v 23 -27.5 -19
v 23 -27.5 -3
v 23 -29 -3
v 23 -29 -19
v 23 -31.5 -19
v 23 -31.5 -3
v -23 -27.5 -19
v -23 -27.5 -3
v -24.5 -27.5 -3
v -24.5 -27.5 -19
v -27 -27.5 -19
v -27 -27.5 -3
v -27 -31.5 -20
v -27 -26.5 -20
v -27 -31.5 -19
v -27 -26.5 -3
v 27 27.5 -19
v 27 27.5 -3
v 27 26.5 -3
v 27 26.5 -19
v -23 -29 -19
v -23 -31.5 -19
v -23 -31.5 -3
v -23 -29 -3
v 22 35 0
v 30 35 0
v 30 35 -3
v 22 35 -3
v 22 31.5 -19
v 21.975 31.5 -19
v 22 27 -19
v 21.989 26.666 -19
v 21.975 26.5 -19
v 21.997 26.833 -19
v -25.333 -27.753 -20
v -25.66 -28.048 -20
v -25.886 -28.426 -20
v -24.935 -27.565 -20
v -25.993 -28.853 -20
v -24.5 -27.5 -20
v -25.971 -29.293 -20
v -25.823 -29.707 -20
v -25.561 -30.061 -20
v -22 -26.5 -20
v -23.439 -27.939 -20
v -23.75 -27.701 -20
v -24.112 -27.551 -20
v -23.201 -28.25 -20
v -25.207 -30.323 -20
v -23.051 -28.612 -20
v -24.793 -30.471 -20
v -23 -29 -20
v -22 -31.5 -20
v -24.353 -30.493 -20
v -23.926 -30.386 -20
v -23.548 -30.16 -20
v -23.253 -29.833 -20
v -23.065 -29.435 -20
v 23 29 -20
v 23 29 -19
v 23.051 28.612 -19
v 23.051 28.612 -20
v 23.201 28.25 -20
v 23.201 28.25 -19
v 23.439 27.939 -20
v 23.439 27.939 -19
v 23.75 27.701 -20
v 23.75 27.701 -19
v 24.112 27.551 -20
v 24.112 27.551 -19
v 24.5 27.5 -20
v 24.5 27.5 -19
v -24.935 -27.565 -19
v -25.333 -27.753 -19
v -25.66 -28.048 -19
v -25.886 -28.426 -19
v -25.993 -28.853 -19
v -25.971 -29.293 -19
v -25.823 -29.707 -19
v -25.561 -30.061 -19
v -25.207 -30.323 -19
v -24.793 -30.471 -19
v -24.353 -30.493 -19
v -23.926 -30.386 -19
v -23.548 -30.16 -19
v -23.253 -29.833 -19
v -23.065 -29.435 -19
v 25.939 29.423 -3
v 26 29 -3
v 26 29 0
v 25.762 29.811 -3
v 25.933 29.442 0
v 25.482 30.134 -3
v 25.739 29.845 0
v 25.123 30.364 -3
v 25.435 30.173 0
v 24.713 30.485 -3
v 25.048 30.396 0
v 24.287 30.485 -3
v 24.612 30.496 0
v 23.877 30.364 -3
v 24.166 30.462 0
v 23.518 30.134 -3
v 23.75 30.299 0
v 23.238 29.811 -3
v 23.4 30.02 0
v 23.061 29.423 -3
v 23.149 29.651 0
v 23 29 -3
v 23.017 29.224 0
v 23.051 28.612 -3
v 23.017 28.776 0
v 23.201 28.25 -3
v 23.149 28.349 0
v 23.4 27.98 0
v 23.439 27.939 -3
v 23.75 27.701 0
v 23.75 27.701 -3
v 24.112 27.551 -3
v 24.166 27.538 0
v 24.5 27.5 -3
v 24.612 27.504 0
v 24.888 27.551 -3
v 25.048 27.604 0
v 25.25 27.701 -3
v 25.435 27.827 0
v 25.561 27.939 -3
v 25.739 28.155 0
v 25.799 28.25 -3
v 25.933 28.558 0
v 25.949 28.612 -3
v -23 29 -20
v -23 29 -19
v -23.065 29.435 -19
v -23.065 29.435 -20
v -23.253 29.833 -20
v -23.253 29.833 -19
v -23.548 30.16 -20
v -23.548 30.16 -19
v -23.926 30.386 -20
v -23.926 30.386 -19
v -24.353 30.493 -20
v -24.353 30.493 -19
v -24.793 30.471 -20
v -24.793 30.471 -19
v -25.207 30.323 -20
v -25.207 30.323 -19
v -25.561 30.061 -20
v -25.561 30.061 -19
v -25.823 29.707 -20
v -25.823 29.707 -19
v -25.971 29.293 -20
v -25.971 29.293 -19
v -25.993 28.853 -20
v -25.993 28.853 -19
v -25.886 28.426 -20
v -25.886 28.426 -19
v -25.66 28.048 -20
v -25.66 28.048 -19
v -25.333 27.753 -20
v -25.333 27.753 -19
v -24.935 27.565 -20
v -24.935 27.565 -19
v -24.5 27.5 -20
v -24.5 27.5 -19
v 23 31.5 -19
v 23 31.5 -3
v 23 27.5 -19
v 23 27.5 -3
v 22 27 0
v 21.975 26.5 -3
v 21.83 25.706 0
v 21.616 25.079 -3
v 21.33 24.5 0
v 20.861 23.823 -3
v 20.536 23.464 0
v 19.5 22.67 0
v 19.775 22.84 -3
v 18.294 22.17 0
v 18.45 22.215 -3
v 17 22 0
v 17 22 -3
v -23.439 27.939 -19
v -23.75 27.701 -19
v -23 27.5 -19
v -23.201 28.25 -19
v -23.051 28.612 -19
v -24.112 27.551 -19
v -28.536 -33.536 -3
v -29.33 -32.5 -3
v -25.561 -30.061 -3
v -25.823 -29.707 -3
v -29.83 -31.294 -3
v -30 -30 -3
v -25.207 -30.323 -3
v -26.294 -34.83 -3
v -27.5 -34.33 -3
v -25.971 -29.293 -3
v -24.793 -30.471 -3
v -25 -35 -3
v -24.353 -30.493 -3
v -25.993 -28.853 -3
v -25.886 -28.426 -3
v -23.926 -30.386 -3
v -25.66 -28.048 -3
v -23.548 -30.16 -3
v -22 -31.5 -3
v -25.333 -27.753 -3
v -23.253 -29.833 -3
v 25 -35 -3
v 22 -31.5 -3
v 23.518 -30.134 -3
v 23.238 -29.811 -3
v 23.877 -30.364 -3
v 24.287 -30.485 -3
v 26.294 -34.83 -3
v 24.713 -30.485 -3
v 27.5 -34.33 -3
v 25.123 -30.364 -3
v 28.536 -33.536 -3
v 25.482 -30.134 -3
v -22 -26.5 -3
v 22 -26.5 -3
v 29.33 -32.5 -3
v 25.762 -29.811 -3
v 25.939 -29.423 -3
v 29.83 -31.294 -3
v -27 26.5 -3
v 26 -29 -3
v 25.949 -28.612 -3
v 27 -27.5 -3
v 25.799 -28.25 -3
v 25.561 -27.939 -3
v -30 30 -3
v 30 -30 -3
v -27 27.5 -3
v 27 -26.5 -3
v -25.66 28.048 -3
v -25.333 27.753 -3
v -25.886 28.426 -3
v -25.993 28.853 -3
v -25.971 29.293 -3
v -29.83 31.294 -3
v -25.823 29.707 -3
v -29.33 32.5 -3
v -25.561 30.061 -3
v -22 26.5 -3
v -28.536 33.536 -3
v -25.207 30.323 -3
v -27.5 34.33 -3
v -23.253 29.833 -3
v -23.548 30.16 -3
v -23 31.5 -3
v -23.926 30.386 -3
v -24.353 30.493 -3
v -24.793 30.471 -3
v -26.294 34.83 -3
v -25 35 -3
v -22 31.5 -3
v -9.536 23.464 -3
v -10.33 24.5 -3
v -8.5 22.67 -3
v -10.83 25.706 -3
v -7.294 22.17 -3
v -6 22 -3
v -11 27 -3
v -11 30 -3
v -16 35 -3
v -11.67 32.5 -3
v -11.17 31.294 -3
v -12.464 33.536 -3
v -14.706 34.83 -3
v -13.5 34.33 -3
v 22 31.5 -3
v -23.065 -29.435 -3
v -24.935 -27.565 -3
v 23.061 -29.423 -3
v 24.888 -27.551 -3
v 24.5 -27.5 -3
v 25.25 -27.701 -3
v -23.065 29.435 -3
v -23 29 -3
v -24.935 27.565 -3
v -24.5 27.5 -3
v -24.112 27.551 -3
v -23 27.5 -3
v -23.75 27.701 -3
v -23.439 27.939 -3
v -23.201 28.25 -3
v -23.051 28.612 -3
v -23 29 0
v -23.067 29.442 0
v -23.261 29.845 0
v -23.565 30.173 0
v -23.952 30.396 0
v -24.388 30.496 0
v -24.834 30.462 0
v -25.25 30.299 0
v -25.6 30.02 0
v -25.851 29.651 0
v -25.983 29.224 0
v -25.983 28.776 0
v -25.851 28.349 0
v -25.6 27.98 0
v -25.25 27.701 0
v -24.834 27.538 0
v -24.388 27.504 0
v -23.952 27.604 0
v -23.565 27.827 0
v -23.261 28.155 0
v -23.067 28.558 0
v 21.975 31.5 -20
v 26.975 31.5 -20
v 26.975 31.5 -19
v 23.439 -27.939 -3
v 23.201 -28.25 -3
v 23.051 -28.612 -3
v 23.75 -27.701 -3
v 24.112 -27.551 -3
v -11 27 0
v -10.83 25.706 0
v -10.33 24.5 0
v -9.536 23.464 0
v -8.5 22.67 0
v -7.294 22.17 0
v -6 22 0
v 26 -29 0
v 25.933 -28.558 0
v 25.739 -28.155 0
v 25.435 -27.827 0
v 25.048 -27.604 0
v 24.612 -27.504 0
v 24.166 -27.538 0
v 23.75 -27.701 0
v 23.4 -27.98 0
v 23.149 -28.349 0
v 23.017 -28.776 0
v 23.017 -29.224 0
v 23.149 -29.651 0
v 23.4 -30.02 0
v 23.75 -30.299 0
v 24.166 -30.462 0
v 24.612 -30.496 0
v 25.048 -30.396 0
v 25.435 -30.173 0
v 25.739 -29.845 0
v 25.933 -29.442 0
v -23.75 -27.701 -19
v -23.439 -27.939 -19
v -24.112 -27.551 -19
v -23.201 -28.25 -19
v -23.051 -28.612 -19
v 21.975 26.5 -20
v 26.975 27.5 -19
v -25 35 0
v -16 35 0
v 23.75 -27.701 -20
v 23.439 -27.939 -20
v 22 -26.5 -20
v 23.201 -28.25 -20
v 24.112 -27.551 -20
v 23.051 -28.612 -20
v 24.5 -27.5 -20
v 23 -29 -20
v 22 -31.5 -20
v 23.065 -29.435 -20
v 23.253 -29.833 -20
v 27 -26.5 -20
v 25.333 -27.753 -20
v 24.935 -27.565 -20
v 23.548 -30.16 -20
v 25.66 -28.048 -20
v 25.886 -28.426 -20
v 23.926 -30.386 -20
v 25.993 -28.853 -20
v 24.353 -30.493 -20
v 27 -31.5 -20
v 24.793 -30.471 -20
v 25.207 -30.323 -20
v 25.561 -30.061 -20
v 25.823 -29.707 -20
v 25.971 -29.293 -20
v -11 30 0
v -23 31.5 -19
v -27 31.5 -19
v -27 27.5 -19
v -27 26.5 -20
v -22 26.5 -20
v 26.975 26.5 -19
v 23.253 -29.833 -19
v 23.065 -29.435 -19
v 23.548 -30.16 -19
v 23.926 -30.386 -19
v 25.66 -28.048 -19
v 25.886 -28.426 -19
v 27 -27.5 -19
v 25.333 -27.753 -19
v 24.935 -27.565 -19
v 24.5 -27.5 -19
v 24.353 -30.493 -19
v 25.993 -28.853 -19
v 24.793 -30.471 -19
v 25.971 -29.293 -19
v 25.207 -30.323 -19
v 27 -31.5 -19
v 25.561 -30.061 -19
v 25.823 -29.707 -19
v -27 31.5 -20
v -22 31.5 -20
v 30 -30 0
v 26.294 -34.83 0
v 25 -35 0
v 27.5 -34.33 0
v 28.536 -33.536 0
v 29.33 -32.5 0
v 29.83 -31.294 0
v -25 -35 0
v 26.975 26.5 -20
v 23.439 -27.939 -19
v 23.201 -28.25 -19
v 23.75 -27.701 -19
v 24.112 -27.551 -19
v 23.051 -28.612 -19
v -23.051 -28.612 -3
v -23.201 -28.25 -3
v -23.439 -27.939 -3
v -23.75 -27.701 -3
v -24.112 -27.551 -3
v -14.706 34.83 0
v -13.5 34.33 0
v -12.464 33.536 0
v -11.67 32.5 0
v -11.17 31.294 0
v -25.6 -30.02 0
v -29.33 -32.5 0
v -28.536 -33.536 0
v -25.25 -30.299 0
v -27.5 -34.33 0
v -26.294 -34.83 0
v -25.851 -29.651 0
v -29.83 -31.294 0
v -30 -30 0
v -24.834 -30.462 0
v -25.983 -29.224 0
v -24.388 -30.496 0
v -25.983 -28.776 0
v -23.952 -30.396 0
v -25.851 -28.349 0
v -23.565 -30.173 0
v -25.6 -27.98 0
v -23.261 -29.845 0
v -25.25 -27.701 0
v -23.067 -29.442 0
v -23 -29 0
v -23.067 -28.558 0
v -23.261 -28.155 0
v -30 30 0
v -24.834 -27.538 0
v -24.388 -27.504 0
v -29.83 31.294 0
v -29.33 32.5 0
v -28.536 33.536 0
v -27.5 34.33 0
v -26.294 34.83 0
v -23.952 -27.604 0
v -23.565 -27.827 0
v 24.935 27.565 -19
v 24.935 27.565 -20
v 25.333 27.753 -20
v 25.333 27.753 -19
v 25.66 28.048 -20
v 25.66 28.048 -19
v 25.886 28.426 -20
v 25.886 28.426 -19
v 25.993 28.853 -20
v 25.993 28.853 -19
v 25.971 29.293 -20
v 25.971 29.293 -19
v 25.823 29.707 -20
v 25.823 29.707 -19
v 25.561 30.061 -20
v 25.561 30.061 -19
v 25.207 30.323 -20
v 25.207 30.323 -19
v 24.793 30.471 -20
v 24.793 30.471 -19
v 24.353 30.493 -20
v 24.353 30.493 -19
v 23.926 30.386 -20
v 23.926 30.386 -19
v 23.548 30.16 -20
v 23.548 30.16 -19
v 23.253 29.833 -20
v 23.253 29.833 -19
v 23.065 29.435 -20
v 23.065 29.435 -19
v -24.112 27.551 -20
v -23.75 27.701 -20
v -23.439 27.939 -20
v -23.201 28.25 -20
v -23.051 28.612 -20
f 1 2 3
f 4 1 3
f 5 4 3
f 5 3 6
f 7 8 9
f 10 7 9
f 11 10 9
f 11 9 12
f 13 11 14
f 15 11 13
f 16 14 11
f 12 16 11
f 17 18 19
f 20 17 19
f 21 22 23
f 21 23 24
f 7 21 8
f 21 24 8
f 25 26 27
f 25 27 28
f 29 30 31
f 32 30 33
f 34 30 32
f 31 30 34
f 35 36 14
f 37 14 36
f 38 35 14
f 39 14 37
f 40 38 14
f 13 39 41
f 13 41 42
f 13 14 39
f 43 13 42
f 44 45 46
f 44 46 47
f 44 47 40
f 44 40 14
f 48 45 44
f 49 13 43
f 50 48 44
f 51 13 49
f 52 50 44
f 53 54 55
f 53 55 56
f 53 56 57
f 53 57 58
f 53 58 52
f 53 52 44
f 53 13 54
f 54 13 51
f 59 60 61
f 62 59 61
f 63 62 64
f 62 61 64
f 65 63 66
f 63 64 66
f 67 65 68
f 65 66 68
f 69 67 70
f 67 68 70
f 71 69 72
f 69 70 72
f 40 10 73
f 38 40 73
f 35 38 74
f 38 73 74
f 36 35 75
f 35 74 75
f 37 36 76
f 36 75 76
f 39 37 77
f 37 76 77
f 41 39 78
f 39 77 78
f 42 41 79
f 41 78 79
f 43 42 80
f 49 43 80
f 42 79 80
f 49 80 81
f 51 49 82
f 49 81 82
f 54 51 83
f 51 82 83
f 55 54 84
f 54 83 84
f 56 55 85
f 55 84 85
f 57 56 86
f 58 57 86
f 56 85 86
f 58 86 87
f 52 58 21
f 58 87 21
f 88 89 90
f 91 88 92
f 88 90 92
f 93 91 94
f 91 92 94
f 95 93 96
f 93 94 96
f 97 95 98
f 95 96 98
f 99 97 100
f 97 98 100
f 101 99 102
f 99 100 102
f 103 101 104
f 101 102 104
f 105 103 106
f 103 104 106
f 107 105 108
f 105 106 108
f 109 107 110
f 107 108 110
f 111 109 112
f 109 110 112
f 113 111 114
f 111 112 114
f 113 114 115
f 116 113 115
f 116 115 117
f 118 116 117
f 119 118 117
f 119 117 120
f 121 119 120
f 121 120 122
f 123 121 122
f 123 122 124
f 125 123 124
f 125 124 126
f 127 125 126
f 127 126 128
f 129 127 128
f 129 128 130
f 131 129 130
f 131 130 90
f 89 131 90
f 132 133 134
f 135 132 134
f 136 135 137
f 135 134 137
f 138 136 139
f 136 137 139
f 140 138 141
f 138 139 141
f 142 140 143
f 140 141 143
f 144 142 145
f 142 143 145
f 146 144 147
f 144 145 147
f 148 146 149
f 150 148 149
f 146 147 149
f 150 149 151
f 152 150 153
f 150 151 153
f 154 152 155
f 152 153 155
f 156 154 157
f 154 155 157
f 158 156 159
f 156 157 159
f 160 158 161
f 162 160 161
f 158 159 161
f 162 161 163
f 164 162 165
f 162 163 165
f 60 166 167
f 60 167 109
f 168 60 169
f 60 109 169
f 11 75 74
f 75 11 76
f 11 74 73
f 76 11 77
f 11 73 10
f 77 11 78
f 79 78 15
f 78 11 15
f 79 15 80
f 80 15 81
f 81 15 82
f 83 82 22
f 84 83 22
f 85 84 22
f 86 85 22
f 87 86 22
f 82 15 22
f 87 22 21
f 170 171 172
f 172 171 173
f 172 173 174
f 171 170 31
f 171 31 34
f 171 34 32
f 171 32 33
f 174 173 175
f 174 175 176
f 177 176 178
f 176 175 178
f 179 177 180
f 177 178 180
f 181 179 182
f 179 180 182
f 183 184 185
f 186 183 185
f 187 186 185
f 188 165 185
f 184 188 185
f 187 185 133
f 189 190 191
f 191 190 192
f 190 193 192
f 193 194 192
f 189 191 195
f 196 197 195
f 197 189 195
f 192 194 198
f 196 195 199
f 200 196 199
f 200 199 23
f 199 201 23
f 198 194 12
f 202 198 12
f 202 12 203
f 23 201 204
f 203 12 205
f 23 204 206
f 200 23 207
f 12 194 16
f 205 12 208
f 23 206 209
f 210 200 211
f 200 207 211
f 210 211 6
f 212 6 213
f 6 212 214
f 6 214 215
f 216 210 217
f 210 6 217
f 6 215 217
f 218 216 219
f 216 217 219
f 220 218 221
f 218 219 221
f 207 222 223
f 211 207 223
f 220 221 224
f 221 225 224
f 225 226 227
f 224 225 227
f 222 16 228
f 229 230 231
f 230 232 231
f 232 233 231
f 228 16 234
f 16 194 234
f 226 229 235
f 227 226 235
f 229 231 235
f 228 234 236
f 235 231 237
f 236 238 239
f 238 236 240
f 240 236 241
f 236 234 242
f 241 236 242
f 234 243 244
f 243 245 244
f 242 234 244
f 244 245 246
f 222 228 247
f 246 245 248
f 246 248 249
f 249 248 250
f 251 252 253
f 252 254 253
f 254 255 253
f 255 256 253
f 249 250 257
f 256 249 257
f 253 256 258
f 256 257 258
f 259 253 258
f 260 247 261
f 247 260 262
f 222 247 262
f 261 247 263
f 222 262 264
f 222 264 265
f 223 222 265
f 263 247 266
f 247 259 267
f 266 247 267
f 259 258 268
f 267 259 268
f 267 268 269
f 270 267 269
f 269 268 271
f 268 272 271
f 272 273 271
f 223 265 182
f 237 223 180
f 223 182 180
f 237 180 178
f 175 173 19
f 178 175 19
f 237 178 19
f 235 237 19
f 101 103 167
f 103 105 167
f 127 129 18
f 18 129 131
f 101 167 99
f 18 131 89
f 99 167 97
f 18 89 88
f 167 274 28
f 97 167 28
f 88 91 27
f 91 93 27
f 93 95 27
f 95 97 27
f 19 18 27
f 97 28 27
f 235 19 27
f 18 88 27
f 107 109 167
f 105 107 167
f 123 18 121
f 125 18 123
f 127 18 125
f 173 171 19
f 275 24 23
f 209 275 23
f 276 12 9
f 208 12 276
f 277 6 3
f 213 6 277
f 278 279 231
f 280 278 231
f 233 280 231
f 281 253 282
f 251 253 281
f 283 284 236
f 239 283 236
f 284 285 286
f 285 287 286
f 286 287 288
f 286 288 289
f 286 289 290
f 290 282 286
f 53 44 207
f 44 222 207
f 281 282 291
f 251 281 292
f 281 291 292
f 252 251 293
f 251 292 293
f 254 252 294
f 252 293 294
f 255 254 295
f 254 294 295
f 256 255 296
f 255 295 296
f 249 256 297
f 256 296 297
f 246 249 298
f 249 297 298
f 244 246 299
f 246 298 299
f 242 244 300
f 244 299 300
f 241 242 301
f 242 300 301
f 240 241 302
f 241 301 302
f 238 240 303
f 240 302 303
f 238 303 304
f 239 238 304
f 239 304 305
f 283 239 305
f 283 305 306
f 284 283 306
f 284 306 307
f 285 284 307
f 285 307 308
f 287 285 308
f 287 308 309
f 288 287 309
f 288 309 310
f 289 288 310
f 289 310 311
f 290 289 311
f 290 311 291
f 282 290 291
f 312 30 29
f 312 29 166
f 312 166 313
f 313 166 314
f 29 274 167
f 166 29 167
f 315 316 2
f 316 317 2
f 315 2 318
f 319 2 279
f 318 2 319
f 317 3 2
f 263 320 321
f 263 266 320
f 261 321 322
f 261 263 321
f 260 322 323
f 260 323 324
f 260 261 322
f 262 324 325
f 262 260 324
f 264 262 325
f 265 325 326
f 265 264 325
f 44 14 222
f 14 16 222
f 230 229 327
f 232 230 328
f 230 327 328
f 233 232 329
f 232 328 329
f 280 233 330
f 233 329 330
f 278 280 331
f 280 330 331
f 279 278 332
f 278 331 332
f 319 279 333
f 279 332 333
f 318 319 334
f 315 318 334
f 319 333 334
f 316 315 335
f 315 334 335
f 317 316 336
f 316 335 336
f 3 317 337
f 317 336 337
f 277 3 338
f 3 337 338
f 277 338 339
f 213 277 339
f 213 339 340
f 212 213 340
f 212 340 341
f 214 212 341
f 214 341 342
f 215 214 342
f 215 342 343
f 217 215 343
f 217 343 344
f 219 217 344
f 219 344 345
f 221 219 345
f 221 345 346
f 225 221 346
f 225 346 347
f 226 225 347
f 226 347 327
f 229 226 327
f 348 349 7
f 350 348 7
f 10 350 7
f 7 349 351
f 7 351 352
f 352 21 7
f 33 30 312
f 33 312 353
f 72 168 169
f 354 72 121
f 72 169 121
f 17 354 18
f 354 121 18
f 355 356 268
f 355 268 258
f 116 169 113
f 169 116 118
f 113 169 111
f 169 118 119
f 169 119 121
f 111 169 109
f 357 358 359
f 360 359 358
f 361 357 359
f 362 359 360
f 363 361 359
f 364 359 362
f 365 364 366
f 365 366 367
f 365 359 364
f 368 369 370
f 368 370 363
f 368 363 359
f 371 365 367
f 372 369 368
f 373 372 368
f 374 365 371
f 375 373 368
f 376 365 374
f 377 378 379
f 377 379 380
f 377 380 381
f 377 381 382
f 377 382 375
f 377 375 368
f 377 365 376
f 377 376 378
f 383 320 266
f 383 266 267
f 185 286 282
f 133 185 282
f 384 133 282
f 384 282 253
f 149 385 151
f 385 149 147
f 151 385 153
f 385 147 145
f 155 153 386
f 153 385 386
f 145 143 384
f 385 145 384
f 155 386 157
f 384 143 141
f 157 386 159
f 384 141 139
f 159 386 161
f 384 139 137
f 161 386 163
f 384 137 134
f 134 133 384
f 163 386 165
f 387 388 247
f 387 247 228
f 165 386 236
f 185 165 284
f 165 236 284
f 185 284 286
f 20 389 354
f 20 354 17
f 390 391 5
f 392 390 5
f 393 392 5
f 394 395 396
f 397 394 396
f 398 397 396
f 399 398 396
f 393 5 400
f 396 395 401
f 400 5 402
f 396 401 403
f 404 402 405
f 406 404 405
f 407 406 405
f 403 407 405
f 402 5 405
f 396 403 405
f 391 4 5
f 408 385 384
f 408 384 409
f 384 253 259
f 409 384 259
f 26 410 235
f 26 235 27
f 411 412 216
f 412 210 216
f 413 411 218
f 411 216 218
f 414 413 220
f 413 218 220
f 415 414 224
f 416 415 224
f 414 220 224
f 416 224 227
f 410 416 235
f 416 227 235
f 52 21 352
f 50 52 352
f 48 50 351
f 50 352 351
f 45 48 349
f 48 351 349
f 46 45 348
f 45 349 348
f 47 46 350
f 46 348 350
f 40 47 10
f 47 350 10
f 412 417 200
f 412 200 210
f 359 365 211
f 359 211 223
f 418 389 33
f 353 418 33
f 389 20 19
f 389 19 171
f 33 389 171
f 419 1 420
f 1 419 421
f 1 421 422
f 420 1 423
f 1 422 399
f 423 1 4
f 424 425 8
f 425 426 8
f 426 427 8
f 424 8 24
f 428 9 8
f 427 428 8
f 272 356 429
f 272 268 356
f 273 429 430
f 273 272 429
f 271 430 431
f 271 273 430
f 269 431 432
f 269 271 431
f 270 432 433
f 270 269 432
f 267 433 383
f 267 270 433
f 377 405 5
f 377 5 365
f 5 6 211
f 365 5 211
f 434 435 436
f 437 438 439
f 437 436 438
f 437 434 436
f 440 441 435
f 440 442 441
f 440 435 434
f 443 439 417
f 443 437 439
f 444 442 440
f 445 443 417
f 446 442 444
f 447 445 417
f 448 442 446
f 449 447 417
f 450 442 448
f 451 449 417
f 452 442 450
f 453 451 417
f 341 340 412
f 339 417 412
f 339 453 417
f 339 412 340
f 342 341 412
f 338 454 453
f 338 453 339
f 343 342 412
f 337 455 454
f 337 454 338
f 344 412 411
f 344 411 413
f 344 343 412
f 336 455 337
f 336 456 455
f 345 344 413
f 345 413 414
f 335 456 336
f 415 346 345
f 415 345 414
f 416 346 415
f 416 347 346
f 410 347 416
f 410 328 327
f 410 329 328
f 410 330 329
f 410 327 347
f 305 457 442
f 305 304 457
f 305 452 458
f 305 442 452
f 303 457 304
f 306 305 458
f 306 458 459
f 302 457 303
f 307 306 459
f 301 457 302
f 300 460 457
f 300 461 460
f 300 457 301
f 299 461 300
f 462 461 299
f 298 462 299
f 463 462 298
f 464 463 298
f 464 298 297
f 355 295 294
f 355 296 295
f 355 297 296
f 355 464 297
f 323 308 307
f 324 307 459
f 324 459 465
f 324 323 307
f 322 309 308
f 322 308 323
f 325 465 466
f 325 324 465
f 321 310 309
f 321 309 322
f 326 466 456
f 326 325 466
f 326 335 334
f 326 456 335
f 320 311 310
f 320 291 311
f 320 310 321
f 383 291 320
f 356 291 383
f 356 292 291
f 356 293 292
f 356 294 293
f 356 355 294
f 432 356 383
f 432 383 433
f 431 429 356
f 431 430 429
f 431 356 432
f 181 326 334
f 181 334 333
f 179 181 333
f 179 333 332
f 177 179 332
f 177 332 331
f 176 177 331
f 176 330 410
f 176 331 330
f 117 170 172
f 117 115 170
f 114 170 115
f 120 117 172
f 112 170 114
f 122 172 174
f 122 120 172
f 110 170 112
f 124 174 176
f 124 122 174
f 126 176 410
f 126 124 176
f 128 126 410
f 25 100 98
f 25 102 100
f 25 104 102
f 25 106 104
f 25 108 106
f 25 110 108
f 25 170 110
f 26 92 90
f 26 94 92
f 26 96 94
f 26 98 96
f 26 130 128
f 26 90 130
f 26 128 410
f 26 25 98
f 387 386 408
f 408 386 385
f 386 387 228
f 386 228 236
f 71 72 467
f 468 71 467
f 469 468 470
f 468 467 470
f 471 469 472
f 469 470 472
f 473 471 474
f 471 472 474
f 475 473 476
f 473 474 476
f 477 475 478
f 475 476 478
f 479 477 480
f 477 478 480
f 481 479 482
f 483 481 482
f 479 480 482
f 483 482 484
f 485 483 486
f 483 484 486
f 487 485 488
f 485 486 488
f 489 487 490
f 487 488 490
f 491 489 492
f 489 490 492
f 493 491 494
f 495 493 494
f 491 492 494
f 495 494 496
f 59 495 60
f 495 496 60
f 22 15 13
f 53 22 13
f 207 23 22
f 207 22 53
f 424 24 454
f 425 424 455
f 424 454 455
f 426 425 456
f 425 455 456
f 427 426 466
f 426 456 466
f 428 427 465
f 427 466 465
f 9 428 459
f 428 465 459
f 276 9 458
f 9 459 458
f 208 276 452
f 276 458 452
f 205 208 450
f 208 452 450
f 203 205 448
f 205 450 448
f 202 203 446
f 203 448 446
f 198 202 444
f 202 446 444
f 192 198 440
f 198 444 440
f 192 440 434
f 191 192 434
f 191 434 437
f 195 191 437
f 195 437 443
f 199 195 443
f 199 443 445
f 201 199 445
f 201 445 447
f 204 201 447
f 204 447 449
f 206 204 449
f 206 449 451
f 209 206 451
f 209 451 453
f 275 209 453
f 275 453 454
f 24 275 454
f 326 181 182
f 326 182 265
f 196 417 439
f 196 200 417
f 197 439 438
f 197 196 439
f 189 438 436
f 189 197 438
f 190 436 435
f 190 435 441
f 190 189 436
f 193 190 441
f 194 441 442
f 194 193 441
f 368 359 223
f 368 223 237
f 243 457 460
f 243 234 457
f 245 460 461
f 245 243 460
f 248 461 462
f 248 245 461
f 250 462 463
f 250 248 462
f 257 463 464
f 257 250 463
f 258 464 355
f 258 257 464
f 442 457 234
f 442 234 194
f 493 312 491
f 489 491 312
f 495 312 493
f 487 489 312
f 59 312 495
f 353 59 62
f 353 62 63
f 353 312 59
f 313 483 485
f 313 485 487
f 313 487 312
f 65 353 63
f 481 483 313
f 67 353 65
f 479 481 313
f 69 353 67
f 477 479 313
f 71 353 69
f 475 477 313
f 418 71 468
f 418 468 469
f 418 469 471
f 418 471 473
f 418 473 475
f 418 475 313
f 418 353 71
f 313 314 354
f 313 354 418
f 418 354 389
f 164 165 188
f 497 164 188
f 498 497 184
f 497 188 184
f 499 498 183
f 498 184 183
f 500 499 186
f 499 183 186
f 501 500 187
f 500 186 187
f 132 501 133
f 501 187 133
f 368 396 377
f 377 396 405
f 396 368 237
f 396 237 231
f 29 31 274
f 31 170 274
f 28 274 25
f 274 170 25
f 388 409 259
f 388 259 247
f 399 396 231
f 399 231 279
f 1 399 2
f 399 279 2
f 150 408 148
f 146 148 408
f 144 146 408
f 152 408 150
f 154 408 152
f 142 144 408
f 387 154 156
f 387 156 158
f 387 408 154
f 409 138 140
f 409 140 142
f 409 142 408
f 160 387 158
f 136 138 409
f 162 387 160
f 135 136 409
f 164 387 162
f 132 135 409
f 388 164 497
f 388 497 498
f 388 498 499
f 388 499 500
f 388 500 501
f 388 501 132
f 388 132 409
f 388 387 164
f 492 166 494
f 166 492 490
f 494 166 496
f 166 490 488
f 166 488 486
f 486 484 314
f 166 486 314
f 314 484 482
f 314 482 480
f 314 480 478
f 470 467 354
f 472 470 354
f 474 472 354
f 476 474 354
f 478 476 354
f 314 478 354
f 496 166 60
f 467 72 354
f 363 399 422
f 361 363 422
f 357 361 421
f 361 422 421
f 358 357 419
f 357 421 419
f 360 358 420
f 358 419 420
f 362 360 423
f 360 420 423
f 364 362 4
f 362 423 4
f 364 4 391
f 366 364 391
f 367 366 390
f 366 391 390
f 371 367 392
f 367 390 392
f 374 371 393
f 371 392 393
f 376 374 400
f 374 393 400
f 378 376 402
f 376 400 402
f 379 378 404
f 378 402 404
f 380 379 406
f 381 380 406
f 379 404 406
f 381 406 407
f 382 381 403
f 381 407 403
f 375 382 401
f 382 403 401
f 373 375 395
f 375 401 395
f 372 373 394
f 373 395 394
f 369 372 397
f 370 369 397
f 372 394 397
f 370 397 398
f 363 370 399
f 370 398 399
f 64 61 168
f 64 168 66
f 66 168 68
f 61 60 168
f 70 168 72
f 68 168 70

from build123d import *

# Parameters (mm, degrees)
F0_R     = 1.5
F1_DEPTH = 3
F3_DEPTH = 16
F4_R     = 5
F5_W     = 5
F5_H     = 5
F6_DEPTH = 1


with BuildPart() as f1:
    # F0 (on Top) → F1 (new body)
    with BuildSketch(Plane.XY):
        Polygon((30, -35), (30, 35), (22, 35), (22, 22), (-11, 22), (-11, 35), (-30, 35), (-30, -35), align=None)
        with Locations((-24.5, -29)):
            Circle(F0_R, mode=Mode.SUBTRACT)
        with Locations((24.5, -29)):
            Circle(F0_R, mode=Mode.SUBTRACT)
        with Locations((-24.5, 29)):
            Circle(F0_R, mode=Mode.SUBTRACT)
        with Locations((24.5, 29)):
            Circle(F0_R, mode=Mode.SUBTRACT)
    extrude(amount=-F1_DEPTH)

    # F2 (on face) → F3 (join)
    with BuildSketch(Plane(origin=(0, 0, -3), x_dir=(1, 0, 0), z_dir=(0, 0, -1))):
        Polygon((27, -26.5), (22, -26.5), (22, -31.5), (23, -31.5), (23, -29), (23, -27.5), (24.5, -27.5), (27, -27.5), align=None)
        Polygon((-22, -31.5), (-22, -26.5), (-27, -26.5), (-27, -27.5), (-24.5, -27.5), (-23, -27.5), (-23, -29), (-23, -31.5), align=None)
        Polygon((-27, 26.5), (-22, 26.5), (-22, 31.5), (-23, 31.5), (-23, 29), (-23, 27.5), (-24.5, 27.5), (-27, 27.5), align=None)
        Polygon((22, 31.5), (22, 26.5), (27, 26.5), (27, 27.5), (24.5, 27.5), (23, 27.5), (23, 29), (23, 31.5), align=None)
    extrude(amount=F3_DEPTH)

    # F4
    f4_edges = [f1.edges().sort_by_distance(p)[0] for p in [
        (-30, 35, -1.5),
        (-30, -35, -1.5),
        (-11, 35, -1.5),
        (-11, 22, -1.5),
        (22, 22, -1.5),
        (30, -35, -1.5),
    ]]
    fillet(f4_edges, radius=F4_R)

    # F5 (on face) → F6 (join)
    with BuildSketch(Plane(origin=(0, 0, -19), x_dir=(1, 0, 0), z_dir=(0, 0, -1))):
        with Locations((-24.5, 29)):
            Rectangle(F5_W, F5_H)
        with BuildLine():
            ThreePointArc((-24.5, 27.5), (-25.56066, 30.06066), (-23, 29))
            ThreePointArc((-23, 29), (-23.43934, 27.93934), (-24.5, 27.5))
        make_face(mode=Mode.SUBTRACT)
        with Locations((24.5, 29)):
            Rectangle(F5_W, F5_H)
        with BuildLine():
            ThreePointArc((24.5, 27.5), (23.43934, 27.93934), (23, 29))
            ThreePointArc((23, 29), (25.56066, 30.06066), (24.5, 27.5))
        make_face(mode=Mode.SUBTRACT)
        with Locations((24.474937, -29)):
            Rectangle(F5_W, F5_H)
        with BuildLine():
            ThreePointArc((24.5, -27.5), (25.56066, -30.06066), (23, -29))
            ThreePointArc((23, -29), (23.43934, -27.93934), (24.5, -27.5))
        make_face(mode=Mode.SUBTRACT)
        with Locations((-24.5, -29)):
            Rectangle(F5_W, F5_H)
        with BuildLine():
            ThreePointArc((-24.5, -27.5), (-23.43934, -27.93934), (-23, -29))
            ThreePointArc((-23, -29), (-25.56066, -30.06066), (-24.5, -27.5))
        make_face(mode=Mode.SUBTRACT)
    extrude(amount=F6_DEPTH)


solid = f1.part
